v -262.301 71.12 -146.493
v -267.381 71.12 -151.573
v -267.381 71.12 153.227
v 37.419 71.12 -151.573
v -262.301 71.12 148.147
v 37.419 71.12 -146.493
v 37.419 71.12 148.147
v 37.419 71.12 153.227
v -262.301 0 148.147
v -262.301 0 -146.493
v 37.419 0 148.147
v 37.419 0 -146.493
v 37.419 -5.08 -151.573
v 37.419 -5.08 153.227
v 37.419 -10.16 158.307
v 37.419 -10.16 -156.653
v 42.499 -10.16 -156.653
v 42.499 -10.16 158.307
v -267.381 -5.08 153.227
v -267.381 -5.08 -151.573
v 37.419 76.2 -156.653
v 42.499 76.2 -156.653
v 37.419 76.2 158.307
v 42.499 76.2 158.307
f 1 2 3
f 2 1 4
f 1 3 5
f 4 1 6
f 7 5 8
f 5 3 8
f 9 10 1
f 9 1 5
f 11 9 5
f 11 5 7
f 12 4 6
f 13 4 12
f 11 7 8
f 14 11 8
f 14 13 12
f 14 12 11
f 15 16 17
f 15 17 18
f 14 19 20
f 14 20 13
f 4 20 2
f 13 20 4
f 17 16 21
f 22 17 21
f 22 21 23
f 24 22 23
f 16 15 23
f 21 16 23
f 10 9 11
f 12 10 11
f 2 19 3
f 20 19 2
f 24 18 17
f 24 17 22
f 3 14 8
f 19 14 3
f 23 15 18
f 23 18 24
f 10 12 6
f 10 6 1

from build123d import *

# Parameters (mm, degrees)
F0_W     = 299.72
F0_H     = 294.64
F1_DEPTH = 5.08
F2_DEPTH = 71.12
F3_W     = 86.36
F3_H     = 314.96
F4_DEPTH = 5.08


with BuildPart() as f1:
    # F0 (on Front) → F1 (new body)
    with BuildSketch(Plane.XZ):
        Polygon((37.4193681992, 153.226976262), (-267.3806318008, 153.226976262), (-267.3806318008, -151.573023738), (37.4193681992, -151.573023738), (37.4193681992, -146.493023738), (-262.3006318008, -146.493023738), (-262.3006318008, 148.146976262), (37.4193681992, 148.146976262), align=None)
        with Locations((-112.4406318008, 0.826976262)):
            Rectangle(F0_W, F0_H)
    extrude(amount=F1_DEPTH)

    # F0 (on Front) → F2 (join)
    with BuildSketch(Plane.XZ):
        Polygon((37.4193681992, 153.226976262), (-267.3806318008, 153.226976262), (-267.3806318008, -151.573023738), (37.4193681992, -151.573023738), (37.4193681992, -146.493023738), (-262.3006318008, -146.493023738), (-262.3006318008, 148.146976262), (37.4193681992, 148.146976262), align=None)
    extrude(amount=-F2_DEPTH)


with BuildPart() as f4:
    # F3 (on face) → F4 (new body)
    with BuildSketch(Plane.YZ.offset(37.4193681992)):
        with Locations((33.02, 0.826976262)):
            Rectangle(F3_W, F3_H)
        Polygon((71.12, -151.573023738), (-5.08, -151.573023738), (-5.08, 153.226976262), (71.12, 153.226976262), (71.12, 148.146976262), (0, 148.146976262), (0, -146.493023738), (71.12, -146.493023738), align=None, mode=Mode.SUBTRACT)
        Polygon((-5.08, 153.226976262), (-5.08, -151.573023738), (71.12, -151.573023738), (71.12, -146.493023738), (0, -146.493023738), (0, 148.146976262), (71.12, 148.146976262), (71.12, 153.226976262), align=None)
    extrude(amount=F4_DEPTH)


solid = Compound([f1.part, f4.part])
